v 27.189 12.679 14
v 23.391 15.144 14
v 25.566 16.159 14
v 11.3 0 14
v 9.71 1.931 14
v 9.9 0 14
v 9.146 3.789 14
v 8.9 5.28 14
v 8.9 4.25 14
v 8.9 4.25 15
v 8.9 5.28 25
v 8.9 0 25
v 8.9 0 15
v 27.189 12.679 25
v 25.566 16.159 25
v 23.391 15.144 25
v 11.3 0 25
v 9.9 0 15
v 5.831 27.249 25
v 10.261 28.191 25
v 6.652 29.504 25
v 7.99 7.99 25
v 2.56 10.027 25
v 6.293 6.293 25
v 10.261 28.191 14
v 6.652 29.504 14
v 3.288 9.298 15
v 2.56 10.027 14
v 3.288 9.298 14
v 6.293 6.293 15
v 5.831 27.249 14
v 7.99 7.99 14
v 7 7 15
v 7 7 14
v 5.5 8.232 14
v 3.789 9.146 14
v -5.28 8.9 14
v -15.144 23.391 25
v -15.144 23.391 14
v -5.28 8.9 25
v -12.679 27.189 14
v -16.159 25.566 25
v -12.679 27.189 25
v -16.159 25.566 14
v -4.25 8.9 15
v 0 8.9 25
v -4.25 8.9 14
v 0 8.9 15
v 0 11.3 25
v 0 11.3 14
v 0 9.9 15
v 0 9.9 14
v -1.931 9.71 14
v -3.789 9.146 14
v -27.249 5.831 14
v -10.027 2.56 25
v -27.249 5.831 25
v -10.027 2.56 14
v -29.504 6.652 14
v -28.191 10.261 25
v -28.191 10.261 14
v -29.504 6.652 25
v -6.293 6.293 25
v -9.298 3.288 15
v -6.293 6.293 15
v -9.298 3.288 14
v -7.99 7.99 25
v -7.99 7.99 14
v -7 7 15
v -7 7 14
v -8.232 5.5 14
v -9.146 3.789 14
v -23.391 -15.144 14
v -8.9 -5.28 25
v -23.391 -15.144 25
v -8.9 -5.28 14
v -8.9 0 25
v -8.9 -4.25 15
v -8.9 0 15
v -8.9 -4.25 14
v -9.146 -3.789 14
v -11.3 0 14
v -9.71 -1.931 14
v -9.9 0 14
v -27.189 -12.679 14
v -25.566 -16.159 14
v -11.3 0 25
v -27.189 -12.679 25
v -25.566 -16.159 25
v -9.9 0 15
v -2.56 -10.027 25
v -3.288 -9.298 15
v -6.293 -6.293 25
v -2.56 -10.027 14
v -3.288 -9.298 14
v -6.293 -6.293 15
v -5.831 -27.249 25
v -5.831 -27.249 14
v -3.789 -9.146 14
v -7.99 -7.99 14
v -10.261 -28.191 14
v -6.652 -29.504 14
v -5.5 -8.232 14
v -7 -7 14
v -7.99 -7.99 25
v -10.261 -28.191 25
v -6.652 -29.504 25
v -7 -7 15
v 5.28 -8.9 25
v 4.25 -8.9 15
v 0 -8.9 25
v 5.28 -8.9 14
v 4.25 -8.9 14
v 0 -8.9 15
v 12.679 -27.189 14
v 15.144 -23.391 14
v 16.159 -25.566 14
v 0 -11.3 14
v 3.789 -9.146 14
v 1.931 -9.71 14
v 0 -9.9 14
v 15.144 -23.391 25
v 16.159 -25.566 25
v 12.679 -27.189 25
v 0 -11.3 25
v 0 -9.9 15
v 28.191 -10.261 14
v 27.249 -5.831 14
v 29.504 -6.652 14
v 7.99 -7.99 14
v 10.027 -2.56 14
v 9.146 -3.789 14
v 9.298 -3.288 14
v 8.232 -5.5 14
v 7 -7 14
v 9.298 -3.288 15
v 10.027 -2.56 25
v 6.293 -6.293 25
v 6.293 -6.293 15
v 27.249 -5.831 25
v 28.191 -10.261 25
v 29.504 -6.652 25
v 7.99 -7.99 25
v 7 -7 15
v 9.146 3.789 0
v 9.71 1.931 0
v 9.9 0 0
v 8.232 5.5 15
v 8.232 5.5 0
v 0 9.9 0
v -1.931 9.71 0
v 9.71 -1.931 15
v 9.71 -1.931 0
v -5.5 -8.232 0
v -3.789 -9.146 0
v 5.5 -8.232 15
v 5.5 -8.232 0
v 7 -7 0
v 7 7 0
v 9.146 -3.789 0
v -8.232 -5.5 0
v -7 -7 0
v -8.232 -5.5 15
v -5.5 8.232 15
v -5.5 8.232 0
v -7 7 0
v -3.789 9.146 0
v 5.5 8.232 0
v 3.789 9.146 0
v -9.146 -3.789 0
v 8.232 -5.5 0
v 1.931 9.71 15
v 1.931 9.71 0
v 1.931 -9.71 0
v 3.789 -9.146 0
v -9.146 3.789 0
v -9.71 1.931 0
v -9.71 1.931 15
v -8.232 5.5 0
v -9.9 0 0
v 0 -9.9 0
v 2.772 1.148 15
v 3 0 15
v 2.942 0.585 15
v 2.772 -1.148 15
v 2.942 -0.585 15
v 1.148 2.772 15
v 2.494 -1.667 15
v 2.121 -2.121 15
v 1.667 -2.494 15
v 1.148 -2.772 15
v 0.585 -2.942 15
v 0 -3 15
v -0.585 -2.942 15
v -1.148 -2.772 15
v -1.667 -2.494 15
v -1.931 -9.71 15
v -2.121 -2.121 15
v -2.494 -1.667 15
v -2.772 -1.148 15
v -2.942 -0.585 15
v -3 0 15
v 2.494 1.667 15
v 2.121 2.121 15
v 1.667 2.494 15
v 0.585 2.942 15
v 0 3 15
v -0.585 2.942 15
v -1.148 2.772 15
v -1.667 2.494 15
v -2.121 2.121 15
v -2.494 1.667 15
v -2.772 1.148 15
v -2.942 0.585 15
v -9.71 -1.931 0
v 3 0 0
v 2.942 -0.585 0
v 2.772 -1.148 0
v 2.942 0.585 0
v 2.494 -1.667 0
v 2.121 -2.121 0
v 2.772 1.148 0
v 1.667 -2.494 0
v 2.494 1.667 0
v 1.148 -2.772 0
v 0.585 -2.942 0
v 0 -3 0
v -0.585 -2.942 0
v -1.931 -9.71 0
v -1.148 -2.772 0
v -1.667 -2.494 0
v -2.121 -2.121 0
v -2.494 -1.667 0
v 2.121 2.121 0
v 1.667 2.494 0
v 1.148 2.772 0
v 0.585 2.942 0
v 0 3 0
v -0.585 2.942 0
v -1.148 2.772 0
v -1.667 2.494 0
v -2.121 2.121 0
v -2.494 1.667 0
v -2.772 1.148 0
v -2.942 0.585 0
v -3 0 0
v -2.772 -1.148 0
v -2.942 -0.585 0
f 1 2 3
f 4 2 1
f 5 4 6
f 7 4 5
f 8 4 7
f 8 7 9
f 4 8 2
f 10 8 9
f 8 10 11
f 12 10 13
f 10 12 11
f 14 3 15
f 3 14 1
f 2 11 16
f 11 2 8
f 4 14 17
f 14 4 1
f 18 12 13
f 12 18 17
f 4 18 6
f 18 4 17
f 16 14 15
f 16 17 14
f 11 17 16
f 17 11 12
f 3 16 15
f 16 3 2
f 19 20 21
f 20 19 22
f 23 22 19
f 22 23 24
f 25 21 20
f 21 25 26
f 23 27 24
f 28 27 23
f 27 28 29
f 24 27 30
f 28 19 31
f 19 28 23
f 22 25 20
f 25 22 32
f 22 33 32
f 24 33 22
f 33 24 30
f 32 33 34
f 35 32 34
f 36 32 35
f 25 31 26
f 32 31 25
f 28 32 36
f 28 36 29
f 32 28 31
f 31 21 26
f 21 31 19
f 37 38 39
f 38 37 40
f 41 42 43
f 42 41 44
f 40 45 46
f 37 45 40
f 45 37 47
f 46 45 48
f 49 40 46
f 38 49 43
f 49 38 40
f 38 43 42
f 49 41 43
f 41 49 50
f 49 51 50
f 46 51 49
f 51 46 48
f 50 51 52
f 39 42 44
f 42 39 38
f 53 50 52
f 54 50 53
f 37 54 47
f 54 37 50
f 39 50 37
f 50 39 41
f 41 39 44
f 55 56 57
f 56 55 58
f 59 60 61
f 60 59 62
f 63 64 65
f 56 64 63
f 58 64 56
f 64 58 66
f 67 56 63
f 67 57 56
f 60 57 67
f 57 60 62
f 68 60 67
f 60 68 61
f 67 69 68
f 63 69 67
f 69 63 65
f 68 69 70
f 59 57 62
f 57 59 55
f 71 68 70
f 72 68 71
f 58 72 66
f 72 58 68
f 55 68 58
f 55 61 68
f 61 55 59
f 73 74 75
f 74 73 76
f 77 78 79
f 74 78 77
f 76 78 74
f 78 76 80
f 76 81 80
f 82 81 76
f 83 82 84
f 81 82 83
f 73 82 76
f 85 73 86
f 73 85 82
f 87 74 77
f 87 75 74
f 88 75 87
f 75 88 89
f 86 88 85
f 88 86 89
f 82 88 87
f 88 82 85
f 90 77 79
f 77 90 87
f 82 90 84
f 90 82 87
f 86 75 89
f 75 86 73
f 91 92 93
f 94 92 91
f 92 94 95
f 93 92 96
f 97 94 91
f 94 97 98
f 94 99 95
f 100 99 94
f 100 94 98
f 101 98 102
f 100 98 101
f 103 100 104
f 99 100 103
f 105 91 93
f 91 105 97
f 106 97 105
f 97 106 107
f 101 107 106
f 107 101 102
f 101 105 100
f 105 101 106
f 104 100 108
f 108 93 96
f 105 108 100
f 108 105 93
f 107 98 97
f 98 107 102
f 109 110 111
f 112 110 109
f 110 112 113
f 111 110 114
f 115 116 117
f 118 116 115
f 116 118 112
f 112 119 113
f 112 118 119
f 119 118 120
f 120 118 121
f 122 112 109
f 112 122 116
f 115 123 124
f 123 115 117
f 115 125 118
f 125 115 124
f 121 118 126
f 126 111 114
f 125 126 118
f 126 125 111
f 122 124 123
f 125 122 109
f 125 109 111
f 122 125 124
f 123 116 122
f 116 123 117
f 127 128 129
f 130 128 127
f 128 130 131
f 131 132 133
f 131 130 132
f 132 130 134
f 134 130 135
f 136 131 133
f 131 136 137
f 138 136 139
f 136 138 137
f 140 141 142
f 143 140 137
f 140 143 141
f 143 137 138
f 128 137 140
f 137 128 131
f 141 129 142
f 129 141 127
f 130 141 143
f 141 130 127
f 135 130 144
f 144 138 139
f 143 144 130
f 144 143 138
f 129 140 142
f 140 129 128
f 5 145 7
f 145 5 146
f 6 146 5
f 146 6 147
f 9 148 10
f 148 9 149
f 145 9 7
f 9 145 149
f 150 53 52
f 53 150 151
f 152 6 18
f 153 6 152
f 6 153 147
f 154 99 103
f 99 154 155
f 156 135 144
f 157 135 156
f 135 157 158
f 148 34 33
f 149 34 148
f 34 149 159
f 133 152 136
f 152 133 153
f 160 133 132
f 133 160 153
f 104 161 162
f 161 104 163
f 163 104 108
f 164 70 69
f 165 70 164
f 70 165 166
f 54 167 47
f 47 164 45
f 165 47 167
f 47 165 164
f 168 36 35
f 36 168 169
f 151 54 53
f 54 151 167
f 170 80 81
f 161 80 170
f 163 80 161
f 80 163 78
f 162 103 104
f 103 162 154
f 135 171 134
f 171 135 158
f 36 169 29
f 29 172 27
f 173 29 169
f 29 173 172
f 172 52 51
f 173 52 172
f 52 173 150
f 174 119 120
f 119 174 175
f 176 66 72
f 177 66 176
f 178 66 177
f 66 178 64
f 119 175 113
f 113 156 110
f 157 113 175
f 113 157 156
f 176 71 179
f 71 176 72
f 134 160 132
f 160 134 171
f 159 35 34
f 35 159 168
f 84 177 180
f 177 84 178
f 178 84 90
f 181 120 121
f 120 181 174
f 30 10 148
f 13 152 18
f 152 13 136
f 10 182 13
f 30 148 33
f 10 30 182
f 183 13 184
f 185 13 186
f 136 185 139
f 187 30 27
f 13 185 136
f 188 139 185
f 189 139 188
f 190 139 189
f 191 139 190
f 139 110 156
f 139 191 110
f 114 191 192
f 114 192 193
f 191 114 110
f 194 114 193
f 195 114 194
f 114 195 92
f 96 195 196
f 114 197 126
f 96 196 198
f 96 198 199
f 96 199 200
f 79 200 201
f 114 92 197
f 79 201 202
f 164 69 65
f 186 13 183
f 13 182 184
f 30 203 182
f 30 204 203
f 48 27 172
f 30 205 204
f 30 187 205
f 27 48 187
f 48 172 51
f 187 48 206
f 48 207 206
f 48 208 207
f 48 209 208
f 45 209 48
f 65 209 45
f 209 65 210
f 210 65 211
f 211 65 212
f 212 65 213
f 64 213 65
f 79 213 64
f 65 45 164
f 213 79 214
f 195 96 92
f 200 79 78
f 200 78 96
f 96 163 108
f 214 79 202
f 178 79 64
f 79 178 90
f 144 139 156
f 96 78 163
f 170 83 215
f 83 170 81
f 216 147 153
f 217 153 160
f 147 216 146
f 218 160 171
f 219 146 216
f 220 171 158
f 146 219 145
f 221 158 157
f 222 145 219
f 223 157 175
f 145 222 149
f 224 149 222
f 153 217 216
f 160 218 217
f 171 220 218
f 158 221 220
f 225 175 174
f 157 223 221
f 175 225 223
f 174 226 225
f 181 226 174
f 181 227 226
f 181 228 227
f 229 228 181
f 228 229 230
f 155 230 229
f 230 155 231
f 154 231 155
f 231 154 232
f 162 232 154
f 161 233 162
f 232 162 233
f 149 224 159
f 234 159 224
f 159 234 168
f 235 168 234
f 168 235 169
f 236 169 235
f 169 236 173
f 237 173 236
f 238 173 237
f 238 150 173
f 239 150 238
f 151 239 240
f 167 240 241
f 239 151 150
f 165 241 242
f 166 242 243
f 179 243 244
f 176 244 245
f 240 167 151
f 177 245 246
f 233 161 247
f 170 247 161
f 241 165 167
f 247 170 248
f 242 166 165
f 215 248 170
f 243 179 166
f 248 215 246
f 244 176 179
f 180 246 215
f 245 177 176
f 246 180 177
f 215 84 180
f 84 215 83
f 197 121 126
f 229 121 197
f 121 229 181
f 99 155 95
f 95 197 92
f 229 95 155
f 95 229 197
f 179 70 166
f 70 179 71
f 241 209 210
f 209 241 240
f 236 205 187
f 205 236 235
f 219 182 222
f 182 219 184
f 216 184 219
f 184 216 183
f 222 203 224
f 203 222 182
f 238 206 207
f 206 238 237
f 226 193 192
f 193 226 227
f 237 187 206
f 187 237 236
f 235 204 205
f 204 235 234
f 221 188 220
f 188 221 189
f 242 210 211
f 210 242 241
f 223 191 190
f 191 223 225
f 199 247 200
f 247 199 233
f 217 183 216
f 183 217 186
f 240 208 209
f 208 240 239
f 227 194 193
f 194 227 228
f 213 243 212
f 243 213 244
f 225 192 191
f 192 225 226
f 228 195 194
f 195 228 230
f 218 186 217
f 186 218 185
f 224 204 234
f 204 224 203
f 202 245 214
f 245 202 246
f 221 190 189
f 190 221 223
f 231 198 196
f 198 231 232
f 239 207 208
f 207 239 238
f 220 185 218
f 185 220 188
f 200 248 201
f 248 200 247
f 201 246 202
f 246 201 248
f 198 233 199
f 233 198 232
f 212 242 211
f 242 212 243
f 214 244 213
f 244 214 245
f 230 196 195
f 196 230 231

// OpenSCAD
$fn = 32;

// ----------------------------------------------------------------------
// Impeller: 60 mm, 8 blades, 25 mm tall
// ----------------------------------------------------------------------

// --- parameters (mm) ---
center_d = 19.8;          // hub diameter
center_h = 15;            // hub height
wheel_d = 60;             // outer diameter over the blades
blade_count = 8;          // number of blades
blade_t = 2.4;            // blade thickness
blade_h = 10;             // blade height
blade_in_r = 8.9;         // blade root radius
blade_out_r = 27.6;       // blade tip radius
sweep = 25;               // blade sweep, degrees
bore_d = 6;               // shaft bore

module hub() {
  cylinder(h = center_h, d = center_d);
}

module blade() {
  /* blade swept between two boxes: hull of the root and the tip section */
  hull() {
    translate([blade_in_r, 0, center_h - 1])
      cube([blade_t, blade_t * 2.2, blade_h + 1], center = false);
    rotate([0, 0, sweep])
      translate([blade_out_r, 0, center_h - 1])
        cube([blade_t, blade_t * 1.6, blade_h + 1], center = false);
  }
}

module blades() {
  for (i = [0 : blade_count - 1])
    rotate([0, 0, i * 360 / blade_count]) blade();
}

difference() {
  union() {
    hub();
    blades();
  }
  translate([0, 0, -1]) cylinder(h = center_h + blade_h + 0 + 3, d = bore_d);
}
